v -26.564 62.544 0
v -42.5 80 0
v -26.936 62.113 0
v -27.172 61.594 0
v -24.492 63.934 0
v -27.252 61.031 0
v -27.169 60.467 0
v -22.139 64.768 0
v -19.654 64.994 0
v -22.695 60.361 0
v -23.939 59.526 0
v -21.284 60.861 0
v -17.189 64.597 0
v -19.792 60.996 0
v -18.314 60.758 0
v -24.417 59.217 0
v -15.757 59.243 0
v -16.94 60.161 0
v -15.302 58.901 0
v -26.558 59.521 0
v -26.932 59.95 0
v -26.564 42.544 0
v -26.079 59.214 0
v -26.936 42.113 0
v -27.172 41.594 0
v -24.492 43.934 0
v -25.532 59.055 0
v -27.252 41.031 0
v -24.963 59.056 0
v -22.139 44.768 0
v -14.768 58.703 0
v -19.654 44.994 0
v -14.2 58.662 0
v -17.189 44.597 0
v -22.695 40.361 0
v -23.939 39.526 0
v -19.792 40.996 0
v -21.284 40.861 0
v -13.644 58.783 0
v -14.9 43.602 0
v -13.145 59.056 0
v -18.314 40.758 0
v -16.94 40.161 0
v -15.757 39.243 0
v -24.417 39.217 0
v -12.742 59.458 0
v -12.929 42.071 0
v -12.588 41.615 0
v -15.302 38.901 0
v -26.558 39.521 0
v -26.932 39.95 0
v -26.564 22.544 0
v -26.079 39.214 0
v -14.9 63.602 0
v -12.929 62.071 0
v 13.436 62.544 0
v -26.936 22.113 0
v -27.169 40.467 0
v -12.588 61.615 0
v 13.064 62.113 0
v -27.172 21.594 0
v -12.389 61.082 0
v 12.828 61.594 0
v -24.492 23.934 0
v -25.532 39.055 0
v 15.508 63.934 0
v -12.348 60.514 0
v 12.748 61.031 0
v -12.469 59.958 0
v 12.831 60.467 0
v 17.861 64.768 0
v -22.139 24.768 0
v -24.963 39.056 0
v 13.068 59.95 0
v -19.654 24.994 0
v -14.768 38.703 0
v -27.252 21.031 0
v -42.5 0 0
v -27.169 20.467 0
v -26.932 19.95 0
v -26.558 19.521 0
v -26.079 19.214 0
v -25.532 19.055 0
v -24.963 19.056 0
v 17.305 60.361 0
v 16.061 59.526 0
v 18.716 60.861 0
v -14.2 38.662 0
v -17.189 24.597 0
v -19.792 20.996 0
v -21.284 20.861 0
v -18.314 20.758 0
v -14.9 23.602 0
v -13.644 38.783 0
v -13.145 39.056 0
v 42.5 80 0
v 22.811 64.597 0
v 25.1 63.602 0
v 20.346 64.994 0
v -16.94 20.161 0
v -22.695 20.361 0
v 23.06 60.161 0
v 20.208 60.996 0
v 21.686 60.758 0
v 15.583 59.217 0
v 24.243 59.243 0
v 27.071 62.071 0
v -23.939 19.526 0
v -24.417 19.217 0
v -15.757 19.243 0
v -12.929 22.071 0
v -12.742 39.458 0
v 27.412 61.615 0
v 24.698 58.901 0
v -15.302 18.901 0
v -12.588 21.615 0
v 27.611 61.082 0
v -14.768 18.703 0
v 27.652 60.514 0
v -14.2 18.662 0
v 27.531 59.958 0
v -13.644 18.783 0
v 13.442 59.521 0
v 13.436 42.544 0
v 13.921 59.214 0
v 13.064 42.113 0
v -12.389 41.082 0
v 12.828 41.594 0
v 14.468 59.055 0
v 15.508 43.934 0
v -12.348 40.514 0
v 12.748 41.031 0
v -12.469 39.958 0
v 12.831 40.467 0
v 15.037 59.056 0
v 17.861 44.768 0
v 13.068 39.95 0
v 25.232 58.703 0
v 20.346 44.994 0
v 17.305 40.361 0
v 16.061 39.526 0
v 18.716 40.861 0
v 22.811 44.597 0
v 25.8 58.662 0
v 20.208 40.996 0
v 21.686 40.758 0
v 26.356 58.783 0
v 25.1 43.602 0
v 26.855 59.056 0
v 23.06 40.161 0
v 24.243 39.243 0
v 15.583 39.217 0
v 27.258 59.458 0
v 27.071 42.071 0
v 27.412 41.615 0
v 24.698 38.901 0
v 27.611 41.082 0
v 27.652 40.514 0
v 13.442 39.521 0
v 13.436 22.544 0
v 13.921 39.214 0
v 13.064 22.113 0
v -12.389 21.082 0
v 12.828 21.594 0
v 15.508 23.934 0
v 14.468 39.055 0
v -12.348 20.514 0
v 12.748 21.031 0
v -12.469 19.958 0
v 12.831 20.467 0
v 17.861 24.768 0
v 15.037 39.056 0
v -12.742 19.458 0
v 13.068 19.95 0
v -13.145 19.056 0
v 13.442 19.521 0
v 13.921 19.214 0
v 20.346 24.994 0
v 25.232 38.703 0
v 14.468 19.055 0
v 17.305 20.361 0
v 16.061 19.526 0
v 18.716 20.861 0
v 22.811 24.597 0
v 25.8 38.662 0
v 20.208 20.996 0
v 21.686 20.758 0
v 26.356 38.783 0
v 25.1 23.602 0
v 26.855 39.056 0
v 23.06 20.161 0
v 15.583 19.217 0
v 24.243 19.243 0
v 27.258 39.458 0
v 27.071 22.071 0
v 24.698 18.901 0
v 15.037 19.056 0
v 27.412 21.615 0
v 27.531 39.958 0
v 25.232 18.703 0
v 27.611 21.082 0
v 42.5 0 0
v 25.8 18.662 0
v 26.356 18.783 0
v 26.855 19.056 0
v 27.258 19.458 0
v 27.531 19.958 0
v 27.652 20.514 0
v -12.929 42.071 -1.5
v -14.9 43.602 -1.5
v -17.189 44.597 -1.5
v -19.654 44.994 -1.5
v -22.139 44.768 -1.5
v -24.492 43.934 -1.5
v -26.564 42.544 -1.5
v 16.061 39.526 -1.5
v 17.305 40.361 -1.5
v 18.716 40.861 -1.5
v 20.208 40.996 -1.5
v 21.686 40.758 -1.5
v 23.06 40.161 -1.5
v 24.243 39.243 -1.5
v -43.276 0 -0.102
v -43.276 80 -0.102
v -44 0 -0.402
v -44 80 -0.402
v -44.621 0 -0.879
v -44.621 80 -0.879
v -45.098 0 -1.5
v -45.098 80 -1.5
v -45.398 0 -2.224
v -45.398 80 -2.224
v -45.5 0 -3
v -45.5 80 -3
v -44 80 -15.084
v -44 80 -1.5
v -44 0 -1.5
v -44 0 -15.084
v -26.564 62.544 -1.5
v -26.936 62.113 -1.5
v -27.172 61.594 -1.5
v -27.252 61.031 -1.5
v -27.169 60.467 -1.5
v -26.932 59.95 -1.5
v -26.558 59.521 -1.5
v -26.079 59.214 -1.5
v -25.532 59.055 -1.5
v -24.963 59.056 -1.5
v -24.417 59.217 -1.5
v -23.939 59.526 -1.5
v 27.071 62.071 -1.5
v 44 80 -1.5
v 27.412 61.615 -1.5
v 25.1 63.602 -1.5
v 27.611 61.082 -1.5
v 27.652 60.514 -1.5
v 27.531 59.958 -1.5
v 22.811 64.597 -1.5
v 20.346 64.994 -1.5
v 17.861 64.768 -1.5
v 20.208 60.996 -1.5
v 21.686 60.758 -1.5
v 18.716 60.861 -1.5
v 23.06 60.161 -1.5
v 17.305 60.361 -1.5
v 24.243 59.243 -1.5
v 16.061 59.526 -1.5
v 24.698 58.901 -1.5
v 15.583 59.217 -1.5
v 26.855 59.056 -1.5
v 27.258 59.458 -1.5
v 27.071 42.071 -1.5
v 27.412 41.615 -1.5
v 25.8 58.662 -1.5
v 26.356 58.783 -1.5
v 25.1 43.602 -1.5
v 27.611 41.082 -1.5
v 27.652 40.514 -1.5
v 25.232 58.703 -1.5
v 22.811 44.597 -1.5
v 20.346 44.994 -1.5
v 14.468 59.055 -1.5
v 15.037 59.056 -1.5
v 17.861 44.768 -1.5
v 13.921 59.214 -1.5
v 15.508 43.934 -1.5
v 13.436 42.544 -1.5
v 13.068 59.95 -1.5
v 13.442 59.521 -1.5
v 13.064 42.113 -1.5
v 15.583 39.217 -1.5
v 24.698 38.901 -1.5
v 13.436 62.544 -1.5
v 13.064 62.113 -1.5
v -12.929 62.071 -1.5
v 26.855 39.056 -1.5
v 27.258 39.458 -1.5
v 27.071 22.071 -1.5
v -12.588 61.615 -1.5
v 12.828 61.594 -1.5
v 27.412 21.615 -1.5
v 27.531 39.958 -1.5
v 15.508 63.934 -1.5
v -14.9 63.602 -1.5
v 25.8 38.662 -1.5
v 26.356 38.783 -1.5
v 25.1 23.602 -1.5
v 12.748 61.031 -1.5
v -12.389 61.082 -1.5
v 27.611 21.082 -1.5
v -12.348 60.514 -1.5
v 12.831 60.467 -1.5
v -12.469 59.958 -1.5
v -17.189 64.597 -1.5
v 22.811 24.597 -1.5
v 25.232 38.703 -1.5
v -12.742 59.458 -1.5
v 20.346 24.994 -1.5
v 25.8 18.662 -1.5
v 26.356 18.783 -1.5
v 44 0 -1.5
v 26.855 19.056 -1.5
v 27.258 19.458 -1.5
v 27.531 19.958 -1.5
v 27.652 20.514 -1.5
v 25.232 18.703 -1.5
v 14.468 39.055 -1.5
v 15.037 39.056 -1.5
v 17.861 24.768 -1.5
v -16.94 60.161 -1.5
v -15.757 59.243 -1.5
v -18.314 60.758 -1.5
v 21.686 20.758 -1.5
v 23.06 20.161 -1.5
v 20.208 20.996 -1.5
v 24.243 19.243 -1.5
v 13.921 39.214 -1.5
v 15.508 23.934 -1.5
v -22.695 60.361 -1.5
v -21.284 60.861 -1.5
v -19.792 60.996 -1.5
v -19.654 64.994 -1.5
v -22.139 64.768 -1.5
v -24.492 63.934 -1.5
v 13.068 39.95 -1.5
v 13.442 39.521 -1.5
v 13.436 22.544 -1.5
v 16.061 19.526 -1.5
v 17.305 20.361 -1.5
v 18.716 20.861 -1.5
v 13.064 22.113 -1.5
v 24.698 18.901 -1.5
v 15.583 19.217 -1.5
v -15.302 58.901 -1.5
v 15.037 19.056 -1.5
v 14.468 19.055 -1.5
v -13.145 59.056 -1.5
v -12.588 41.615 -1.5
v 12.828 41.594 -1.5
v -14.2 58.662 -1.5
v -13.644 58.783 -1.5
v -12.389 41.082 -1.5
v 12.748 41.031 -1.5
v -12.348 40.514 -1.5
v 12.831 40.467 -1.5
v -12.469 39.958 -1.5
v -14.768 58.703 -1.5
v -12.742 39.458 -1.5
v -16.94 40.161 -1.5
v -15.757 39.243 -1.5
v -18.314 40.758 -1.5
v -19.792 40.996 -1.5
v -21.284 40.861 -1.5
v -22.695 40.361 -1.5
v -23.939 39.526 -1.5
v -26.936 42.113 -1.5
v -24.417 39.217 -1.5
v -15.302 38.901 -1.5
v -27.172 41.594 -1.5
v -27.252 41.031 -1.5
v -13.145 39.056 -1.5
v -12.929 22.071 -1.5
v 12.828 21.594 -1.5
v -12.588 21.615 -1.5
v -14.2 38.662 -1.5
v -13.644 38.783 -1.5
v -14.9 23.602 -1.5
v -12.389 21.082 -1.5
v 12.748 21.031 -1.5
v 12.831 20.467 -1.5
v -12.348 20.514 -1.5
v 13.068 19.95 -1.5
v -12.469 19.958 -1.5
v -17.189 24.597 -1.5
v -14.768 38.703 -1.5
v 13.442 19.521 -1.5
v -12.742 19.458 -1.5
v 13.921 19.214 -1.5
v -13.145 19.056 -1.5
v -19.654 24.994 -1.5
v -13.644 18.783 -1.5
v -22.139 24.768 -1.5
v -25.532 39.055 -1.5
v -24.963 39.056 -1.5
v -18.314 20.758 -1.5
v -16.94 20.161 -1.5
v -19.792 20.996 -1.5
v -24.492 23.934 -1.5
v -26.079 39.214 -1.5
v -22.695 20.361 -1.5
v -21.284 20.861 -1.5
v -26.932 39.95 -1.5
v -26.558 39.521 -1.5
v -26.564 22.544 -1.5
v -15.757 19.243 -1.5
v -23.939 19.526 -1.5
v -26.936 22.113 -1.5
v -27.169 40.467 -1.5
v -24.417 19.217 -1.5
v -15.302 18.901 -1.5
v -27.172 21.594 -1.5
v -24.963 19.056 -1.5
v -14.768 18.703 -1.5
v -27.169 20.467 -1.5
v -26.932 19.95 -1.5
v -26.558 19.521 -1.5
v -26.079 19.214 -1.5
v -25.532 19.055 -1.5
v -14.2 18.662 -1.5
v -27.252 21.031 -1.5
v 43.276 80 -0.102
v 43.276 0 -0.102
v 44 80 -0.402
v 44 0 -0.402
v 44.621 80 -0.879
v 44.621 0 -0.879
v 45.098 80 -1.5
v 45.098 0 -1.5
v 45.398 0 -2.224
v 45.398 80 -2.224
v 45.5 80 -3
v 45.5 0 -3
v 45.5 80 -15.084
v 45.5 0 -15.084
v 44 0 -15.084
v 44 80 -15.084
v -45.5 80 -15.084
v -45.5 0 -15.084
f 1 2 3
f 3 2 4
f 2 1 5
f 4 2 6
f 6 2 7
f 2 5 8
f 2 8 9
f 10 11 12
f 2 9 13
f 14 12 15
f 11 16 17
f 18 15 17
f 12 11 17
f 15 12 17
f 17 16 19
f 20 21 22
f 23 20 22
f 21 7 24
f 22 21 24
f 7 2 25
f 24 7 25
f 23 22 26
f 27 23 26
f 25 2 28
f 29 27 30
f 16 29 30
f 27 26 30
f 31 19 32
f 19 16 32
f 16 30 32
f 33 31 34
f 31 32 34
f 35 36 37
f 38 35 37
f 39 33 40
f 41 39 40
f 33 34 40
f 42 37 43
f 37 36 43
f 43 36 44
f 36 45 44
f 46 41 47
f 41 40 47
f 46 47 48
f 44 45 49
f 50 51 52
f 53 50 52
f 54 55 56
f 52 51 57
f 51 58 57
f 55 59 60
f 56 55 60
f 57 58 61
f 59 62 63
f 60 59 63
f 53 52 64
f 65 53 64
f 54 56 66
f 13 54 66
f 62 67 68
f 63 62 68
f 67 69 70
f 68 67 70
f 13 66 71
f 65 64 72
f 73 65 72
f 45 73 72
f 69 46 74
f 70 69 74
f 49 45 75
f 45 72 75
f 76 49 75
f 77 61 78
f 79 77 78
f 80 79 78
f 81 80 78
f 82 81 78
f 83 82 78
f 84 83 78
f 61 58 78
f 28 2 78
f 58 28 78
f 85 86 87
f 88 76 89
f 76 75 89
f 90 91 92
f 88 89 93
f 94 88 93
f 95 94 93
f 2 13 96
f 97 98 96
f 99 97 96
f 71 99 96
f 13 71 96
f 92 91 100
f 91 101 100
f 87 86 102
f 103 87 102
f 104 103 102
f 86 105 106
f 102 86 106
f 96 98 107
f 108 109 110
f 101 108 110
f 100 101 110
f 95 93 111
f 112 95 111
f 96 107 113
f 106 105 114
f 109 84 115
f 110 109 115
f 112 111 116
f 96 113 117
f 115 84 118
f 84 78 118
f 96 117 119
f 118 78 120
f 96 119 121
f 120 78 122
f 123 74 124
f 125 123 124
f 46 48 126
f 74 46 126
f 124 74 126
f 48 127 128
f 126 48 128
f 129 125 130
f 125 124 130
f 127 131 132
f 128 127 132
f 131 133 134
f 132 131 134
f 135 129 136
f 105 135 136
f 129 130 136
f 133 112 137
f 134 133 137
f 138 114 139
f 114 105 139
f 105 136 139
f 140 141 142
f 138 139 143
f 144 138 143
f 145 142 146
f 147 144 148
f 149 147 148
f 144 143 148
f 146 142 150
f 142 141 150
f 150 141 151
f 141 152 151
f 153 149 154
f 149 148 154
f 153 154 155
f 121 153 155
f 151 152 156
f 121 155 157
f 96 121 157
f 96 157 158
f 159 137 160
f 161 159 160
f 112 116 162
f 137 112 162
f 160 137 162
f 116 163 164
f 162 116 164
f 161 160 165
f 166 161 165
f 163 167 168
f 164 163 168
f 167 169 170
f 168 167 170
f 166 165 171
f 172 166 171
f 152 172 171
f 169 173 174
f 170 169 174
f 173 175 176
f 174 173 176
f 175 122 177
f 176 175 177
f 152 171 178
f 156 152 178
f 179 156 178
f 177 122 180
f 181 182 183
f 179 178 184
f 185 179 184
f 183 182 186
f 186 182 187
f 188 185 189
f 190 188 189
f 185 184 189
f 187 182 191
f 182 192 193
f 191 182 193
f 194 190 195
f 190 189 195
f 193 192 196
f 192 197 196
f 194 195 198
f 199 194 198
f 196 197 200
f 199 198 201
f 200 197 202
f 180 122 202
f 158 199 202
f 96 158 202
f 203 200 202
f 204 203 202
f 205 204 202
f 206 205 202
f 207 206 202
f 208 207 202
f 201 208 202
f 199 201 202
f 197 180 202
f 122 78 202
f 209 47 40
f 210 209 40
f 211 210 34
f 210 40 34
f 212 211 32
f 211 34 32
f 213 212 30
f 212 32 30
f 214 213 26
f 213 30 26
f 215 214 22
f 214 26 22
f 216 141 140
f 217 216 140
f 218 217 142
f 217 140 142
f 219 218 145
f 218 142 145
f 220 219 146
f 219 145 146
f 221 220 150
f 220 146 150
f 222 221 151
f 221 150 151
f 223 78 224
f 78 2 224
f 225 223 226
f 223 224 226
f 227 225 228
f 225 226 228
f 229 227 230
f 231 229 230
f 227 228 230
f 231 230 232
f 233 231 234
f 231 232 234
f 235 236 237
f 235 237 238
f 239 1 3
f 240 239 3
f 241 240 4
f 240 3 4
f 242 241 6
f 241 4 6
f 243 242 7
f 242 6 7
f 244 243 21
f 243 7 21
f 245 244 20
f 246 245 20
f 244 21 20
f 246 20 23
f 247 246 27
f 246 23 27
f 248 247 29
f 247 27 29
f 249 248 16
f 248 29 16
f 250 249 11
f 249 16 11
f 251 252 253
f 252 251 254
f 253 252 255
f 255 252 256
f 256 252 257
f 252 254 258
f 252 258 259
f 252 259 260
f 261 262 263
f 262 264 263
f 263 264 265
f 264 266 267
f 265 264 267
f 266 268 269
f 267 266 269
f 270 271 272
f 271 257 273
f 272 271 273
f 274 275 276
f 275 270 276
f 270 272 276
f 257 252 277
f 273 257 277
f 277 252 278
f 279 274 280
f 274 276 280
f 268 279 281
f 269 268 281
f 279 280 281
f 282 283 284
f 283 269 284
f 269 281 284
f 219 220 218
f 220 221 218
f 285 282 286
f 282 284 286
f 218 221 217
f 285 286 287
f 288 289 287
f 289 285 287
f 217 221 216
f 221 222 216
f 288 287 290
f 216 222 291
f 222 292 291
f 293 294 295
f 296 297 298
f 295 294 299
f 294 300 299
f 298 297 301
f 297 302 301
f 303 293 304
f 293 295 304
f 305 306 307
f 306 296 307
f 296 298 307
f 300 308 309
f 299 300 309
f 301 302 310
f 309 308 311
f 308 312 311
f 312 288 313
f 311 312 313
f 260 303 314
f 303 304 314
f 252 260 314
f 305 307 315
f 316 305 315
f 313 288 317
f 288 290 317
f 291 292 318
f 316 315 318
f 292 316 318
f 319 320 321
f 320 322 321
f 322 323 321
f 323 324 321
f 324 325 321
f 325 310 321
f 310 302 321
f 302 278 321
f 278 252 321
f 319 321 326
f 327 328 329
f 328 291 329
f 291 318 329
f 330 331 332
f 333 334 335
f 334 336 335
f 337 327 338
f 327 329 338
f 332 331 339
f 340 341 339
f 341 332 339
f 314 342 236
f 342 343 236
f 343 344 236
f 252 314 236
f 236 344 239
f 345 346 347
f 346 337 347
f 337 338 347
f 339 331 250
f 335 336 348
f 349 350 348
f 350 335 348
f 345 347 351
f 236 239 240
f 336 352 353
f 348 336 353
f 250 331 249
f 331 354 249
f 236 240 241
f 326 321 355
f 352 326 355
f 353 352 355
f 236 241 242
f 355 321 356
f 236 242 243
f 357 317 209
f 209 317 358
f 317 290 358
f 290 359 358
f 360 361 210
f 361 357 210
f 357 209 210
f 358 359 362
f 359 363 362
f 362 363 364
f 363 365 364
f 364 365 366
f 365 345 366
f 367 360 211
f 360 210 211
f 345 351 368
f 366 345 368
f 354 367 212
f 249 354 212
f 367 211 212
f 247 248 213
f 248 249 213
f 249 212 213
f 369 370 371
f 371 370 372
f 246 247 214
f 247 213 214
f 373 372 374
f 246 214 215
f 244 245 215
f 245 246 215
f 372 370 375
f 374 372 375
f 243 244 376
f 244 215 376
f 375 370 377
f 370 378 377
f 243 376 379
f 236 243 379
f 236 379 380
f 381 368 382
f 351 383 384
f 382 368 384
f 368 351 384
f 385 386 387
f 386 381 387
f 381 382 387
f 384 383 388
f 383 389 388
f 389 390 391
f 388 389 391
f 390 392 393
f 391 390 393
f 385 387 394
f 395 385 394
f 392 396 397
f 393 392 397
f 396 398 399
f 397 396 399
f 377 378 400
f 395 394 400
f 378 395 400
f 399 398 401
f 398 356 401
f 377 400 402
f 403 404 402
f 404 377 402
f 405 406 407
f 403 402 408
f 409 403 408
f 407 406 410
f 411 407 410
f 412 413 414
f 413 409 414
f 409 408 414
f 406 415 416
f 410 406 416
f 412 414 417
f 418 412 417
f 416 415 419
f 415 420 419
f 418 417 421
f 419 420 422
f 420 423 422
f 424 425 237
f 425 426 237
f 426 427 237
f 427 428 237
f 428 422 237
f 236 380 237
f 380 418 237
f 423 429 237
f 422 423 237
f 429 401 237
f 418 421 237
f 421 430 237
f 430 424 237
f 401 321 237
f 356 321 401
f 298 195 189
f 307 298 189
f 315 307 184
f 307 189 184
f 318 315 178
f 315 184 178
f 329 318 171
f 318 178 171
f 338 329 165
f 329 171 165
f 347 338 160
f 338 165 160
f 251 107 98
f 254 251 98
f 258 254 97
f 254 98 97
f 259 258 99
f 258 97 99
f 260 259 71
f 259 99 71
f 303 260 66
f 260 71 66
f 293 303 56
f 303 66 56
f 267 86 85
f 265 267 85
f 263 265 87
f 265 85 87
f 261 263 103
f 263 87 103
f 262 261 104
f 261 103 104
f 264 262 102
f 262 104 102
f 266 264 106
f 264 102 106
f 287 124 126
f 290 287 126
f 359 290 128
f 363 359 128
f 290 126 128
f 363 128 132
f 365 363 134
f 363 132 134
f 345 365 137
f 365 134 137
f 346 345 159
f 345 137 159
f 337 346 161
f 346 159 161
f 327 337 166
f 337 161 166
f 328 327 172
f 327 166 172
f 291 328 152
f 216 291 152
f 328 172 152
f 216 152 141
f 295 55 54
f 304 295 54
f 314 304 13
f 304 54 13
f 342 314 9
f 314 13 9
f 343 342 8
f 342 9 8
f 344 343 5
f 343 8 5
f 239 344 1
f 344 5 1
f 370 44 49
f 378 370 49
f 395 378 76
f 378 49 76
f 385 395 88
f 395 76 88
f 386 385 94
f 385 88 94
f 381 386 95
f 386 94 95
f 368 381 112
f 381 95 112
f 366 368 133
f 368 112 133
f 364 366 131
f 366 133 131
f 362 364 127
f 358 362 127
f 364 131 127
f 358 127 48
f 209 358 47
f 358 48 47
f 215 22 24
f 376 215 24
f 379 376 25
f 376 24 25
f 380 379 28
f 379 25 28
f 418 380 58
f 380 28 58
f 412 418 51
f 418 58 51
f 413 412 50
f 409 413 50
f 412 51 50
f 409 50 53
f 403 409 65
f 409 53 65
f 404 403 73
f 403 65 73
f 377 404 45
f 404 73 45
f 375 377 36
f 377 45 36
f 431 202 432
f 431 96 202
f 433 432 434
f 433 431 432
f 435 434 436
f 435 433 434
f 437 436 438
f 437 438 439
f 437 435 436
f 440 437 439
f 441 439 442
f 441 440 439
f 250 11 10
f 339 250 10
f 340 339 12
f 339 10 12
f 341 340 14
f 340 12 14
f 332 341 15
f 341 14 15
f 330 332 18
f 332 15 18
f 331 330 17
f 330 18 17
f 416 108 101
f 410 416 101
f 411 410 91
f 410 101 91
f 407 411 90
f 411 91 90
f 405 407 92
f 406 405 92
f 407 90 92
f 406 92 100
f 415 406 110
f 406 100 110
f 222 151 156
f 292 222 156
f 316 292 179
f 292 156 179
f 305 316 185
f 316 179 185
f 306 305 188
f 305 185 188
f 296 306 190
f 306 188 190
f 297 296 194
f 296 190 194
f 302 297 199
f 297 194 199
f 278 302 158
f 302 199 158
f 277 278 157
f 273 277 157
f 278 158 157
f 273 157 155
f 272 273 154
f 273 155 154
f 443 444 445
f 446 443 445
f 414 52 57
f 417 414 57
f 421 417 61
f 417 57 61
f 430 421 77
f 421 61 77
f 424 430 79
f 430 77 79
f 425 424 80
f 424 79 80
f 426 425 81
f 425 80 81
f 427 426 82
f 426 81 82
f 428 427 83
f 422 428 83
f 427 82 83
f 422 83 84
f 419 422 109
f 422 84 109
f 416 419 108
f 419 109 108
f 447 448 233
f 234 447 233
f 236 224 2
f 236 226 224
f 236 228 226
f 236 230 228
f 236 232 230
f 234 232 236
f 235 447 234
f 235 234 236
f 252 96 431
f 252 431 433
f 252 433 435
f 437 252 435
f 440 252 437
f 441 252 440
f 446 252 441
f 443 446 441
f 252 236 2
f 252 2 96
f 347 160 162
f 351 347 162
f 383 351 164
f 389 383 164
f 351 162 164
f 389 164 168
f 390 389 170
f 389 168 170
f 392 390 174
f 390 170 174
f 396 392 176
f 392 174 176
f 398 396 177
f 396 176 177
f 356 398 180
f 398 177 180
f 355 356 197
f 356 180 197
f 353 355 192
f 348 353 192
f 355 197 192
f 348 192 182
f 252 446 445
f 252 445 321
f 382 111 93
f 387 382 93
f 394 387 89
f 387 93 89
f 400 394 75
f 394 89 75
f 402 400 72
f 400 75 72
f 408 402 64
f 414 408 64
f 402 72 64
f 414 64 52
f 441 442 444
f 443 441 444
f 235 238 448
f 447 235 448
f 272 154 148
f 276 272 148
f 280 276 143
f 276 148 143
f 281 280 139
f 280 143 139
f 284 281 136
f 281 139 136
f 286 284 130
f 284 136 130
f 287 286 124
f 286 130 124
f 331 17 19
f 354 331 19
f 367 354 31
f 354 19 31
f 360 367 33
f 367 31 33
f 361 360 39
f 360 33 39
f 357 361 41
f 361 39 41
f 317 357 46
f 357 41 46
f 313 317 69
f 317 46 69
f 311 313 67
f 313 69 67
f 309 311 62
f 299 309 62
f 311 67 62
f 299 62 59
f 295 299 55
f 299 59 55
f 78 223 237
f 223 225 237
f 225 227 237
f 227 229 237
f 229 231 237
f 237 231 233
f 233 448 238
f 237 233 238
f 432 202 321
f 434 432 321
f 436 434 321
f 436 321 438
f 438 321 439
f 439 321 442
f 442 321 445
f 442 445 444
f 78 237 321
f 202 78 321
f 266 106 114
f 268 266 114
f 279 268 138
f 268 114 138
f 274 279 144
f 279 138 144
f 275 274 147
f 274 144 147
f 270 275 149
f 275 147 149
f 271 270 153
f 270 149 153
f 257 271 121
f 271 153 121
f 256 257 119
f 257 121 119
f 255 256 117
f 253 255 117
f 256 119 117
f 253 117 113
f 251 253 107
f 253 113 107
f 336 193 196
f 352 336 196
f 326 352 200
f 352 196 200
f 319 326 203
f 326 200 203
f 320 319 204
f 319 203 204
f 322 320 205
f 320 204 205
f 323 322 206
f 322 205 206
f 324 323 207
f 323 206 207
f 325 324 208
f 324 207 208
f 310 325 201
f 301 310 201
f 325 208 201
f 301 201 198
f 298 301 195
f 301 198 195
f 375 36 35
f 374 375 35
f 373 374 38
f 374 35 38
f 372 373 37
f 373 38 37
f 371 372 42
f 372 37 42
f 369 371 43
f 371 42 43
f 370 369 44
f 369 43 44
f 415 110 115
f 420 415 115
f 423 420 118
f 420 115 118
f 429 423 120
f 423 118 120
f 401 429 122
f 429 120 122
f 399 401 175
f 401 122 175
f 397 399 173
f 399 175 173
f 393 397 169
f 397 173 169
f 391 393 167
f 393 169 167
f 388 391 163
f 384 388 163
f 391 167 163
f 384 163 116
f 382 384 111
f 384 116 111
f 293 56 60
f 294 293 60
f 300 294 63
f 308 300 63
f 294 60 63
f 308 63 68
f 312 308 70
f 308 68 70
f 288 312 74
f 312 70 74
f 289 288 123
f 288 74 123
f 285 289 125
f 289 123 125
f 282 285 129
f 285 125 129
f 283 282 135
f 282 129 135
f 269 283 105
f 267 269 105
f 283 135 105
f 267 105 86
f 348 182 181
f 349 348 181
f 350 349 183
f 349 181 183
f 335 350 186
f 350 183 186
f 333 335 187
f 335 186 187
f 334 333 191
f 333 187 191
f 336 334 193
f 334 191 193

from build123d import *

# Parameters (mm, degrees)
BOSS_EXTRUDE1_DEPTH = 80
FILLET1_R           = 3
CUT_EXTRUDE1_DEPTH  = 1.5


with BuildPart() as part:
    # Sketch1 → Boss-Extrude1 (new body)
    with BuildSketch(Plane(origin=(0, 0, 0), x_dir=(1, 0, 0), z_dir=(0, 1, 0))):
        Polygon((-45.5, 0), (45.5, 0), (45.5, 15.083653846), (44, 15.083653846), (44, 1.5), (-44, 1.5), (-44, 15.083653846), (-45.5, 15.083653846), align=None)
    extrude(amount=BOSS_EXTRUDE1_DEPTH)

    # Fillet1
    fillet1_edges = [part.edges().sort_by_distance(p)[0] for p in [
        (45.5, 40, 0),
        (-45.5, 40, 0),
    ]]
    fillet(fillet1_edges, radius=FILLET1_R)

    # Sketch2 → Cut-Extrude1 (cut)
    with BuildSketch(Plane.XY):
        with BuildLine():
            ThreePointArc((-12.928932188, 62.071067812), (-19.653586872, 64.993998096), (-26.564488849, 62.543705068))
            ThreePointArc((-26.564488849, 62.543705068), (-26.760332093, 59.722066284), (-23.938693309, 59.526223041))
            ThreePointArc((-23.938693309, 59.526223041), (-19.792152123, 60.996398858), (-15.757359313, 59.242640687))
            ThreePointArc((-15.757359313, 59.242640687), (-12.928932188, 59.242640687), (-12.928932188, 62.071067812))
        make_face()
        with BuildLine():
            ThreePointArc((27.071067812, 62.071067812), (20.346413128, 64.993998096), (13.435511151, 62.543705068))
            ThreePointArc((13.435511151, 62.543705068), (13.239667907, 59.722066284), (16.061306691, 59.526223041))
            ThreePointArc((16.061306691, 59.526223041), (20.207847877, 60.996398858), (24.242640687, 59.242640687))
            ThreePointArc((24.242640687, 59.242640687), (27.071067812, 59.242640687), (27.071067812, 62.071067812))
        make_face()
        with BuildLine():
            ThreePointArc((27.071067812, 42.071067812), (20.346413128, 44.993998096), (13.435511151, 42.543705068))
            ThreePointArc((13.435511151, 42.543705068), (13.239667907, 39.722066284), (16.061306691, 39.526223041))
            ThreePointArc((16.061306691, 39.526223041), (20.207847877, 40.996398858), (24.242640687, 39.242640687))
            ThreePointArc((24.242640687, 39.242640687), (27.071067812, 39.242640687), (27.071067812, 42.071067812))
        make_face()
        with BuildLine():
            ThreePointArc((27.071067812, 22.071067812), (20.346413128, 24.993998096), (13.435511151, 22.543705068))
            ThreePointArc((13.435511151, 22.543705068), (13.239667907, 19.722066284), (16.061306691, 19.526223041))
            ThreePointArc((16.061306691, 19.526223041), (20.207847877, 20.996398858), (24.242640687, 19.242640687))
            ThreePointArc((24.242640687, 19.242640687), (27.071067812, 19.242640687), (27.071067812, 22.071067812))
        make_face()
        with BuildLine():
            ThreePointArc((-12.928932188, 42.071067812), (-19.653586872, 44.993998096), (-26.564488849, 42.543705068))
            ThreePointArc((-26.564488849, 42.543705068), (-26.760332093, 39.722066284), (-23.938693309, 39.526223041))
            ThreePointArc((-23.938693309, 39.526223041), (-19.792152123, 40.996398858), (-15.757359313, 39.242640687))
            ThreePointArc((-15.757359313, 39.242640687), (-12.928932188, 39.242640687), (-12.928932188, 42.071067812))
        make_face()
        with BuildLine():
            ThreePointArc((-12.928932188, 22.071067812), (-19.653586872, 24.993998096), (-26.564488849, 22.543705068))
            ThreePointArc((-26.564488849, 22.543705068), (-26.760332093, 19.722066284), (-23.938693309, 19.526223041))
            ThreePointArc((-23.938693309, 19.526223041), (-19.792152123, 20.996398858), (-15.757359313, 19.242640687))
            ThreePointArc((-15.757359313, 19.242640687), (-12.928932188, 19.242640687), (-12.928932188, 22.071067812))
        make_face()
    extrude(amount=-CUT_EXTRUDE1_DEPTH, mode=Mode.SUBTRACT)


solid = part.part
